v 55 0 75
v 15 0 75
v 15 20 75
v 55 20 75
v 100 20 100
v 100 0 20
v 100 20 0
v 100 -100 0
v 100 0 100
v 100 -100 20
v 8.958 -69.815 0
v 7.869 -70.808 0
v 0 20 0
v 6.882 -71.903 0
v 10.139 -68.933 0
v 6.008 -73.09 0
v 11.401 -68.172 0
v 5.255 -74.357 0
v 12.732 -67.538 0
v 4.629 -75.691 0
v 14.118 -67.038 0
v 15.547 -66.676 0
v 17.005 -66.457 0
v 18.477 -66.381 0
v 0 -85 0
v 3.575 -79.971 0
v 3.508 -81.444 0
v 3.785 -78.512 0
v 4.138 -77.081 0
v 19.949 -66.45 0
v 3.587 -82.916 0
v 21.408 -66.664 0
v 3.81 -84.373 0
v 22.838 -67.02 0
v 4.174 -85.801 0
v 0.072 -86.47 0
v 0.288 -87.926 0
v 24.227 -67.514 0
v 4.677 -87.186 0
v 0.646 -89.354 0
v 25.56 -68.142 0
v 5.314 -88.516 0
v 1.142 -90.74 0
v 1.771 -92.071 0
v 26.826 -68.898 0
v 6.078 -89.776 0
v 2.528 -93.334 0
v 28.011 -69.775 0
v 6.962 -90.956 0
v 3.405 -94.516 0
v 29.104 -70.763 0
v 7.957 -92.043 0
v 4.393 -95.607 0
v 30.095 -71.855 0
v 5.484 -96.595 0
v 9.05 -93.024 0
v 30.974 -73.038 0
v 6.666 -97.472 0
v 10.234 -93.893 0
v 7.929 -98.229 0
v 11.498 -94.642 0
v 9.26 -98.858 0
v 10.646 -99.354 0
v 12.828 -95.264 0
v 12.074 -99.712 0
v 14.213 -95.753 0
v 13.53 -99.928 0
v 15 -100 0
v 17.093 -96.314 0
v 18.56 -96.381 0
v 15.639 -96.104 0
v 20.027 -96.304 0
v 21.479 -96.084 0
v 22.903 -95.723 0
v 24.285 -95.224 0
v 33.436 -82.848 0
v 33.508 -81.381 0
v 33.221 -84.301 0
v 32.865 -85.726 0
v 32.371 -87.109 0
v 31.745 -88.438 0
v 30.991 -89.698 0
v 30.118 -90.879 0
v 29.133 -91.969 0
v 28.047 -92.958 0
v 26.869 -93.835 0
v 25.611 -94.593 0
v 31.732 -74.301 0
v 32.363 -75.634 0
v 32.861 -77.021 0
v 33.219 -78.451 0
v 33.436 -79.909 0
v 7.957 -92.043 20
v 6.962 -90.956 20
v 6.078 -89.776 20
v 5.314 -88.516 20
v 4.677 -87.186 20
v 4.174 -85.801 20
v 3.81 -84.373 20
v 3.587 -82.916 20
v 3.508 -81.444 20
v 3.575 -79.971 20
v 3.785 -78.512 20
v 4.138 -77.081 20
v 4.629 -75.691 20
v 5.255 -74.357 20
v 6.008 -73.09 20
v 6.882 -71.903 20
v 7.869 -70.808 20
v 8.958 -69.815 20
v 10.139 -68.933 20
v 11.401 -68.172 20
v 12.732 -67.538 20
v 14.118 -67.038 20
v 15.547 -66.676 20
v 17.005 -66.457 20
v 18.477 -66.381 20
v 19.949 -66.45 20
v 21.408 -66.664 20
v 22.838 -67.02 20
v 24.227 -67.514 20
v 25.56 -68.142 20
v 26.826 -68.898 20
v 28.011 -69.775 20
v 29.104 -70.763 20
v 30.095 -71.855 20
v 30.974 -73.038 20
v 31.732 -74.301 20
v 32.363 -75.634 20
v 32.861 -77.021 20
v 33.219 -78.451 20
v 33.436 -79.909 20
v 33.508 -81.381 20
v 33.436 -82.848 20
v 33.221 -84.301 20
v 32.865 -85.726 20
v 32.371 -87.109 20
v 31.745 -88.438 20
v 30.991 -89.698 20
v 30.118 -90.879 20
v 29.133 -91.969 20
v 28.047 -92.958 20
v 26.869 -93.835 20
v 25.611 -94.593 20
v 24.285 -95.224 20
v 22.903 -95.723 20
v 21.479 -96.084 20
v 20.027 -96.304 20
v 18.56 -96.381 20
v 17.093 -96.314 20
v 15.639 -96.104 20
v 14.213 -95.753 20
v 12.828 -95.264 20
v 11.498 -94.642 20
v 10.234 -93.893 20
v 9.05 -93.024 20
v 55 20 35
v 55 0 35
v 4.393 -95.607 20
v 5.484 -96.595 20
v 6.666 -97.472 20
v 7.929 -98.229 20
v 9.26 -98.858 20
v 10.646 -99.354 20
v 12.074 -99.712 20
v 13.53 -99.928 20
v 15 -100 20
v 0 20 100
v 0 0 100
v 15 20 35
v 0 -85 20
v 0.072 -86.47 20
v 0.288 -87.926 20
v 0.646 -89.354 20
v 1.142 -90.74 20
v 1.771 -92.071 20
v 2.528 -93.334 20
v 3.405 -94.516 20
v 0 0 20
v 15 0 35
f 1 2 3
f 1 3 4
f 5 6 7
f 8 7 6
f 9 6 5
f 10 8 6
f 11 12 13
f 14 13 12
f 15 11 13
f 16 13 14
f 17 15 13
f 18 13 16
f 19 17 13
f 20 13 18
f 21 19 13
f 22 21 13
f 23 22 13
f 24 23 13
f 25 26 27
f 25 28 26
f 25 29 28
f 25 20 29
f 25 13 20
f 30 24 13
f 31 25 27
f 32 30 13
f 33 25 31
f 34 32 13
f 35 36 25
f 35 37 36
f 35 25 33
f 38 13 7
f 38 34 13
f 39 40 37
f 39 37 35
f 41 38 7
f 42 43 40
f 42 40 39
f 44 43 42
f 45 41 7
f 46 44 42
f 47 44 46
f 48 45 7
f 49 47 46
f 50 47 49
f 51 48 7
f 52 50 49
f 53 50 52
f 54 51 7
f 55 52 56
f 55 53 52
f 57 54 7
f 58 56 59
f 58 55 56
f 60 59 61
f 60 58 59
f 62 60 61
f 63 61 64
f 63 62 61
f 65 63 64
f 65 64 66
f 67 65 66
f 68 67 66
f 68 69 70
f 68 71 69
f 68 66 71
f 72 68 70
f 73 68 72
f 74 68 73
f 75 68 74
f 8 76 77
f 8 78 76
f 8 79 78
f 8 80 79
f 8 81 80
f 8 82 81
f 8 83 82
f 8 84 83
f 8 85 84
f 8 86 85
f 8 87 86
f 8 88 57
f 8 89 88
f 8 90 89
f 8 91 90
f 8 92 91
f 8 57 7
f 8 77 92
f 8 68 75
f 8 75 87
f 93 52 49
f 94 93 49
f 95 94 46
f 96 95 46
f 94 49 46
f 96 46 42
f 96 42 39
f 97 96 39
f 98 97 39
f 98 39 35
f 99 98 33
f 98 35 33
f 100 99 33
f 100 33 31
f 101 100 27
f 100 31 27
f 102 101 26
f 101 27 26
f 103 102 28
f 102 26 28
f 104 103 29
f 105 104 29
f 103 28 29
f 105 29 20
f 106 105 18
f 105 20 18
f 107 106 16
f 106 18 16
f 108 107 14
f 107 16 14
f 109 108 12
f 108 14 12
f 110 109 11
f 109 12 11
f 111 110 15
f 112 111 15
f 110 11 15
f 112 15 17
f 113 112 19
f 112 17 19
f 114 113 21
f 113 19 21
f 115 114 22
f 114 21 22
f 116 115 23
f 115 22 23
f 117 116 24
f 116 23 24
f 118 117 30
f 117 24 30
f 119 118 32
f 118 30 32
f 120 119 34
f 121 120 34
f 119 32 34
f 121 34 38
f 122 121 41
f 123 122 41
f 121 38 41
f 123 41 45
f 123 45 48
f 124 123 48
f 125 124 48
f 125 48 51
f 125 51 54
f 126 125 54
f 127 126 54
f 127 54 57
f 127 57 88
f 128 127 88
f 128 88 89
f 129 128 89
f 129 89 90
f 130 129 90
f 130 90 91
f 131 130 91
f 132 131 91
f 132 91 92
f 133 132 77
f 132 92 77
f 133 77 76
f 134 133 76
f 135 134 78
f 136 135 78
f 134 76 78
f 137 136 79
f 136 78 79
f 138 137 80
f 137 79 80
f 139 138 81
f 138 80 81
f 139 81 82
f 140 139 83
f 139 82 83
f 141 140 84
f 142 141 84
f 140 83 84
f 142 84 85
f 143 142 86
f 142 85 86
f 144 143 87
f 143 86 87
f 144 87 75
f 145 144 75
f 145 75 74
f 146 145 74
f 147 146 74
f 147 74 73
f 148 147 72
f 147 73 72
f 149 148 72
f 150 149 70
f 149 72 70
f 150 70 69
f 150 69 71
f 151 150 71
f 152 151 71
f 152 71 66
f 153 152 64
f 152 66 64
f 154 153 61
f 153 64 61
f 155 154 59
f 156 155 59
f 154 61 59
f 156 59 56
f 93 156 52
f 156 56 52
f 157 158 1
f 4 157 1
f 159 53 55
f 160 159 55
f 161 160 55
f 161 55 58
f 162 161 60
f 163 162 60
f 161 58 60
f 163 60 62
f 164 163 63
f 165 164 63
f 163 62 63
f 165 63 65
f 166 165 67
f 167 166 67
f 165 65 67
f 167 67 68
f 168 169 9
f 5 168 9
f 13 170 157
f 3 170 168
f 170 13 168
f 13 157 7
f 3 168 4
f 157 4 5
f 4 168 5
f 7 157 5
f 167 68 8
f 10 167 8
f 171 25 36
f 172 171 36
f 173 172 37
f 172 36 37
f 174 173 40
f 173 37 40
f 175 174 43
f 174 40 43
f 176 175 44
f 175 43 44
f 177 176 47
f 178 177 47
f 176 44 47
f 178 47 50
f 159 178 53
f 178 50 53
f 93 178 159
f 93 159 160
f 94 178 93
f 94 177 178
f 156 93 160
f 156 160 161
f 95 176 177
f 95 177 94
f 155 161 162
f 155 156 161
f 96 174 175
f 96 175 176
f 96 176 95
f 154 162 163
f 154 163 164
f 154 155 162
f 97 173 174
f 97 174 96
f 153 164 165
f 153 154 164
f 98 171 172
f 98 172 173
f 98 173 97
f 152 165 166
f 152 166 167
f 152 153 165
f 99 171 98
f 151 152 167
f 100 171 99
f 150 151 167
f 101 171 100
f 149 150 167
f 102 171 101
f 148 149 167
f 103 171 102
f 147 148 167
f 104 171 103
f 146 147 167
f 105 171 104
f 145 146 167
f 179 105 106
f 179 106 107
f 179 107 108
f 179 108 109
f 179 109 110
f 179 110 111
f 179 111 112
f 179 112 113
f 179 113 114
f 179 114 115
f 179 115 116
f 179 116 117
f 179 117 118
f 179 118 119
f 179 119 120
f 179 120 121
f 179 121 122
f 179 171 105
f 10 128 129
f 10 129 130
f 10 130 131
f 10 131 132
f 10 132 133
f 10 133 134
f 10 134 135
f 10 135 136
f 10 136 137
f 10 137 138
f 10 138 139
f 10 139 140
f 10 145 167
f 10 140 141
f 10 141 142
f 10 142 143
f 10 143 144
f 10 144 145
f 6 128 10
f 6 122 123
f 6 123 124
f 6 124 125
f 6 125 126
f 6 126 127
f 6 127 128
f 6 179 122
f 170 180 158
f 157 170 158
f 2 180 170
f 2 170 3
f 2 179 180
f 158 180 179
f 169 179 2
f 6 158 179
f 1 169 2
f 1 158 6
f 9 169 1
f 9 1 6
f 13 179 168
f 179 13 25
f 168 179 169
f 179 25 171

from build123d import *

# Parameters (mm, degrees)
F1_DEPTH = 20
F2_W     = 100
F2_H     = 100
F2_W_2   = 40
F2_H_2   = 40
F3_DEPTH = 20


with BuildPart() as f1:
    # F0 (on Top) → F1 (new body)
    with BuildSketch(Plane.XY):
        with BuildLine():
            Line((100, 0), (0, 0))
            Line((0, 0), (0, -85))
            ThreePointArc((0, -85), (1.141807, -90.740251), (4.393398, -95.606602))
            ThreePointArc((4.393398, -95.606602), (9.259749, -98.858193), (15, -100))
            Line((15, -100), (100, -100))
            Line((100, -100), (100, 0))
        make_face()
        with BuildLine():
            ThreePointArc((33.508259, -81.381075), (24.284639, -95.224247), (7.957134, -92.042866))
            ThreePointArc((7.957134, -92.042866), (12.731878, -67.537902), (33.508259, -81.381075))
        make_face(mode=Mode.SUBTRACT)
    extrude(amount=F1_DEPTH)

    # F2 (on Front) → F3 (join)
    with BuildSketch(Plane.XZ):
        with Locations((50, 50)):
            Rectangle(F2_W, F2_H)
        with Locations((35, 55)):
            Rectangle(F2_W_2, F2_H_2, mode=Mode.SUBTRACT)
    extrude(amount=-F3_DEPTH)


solid = f1.part
